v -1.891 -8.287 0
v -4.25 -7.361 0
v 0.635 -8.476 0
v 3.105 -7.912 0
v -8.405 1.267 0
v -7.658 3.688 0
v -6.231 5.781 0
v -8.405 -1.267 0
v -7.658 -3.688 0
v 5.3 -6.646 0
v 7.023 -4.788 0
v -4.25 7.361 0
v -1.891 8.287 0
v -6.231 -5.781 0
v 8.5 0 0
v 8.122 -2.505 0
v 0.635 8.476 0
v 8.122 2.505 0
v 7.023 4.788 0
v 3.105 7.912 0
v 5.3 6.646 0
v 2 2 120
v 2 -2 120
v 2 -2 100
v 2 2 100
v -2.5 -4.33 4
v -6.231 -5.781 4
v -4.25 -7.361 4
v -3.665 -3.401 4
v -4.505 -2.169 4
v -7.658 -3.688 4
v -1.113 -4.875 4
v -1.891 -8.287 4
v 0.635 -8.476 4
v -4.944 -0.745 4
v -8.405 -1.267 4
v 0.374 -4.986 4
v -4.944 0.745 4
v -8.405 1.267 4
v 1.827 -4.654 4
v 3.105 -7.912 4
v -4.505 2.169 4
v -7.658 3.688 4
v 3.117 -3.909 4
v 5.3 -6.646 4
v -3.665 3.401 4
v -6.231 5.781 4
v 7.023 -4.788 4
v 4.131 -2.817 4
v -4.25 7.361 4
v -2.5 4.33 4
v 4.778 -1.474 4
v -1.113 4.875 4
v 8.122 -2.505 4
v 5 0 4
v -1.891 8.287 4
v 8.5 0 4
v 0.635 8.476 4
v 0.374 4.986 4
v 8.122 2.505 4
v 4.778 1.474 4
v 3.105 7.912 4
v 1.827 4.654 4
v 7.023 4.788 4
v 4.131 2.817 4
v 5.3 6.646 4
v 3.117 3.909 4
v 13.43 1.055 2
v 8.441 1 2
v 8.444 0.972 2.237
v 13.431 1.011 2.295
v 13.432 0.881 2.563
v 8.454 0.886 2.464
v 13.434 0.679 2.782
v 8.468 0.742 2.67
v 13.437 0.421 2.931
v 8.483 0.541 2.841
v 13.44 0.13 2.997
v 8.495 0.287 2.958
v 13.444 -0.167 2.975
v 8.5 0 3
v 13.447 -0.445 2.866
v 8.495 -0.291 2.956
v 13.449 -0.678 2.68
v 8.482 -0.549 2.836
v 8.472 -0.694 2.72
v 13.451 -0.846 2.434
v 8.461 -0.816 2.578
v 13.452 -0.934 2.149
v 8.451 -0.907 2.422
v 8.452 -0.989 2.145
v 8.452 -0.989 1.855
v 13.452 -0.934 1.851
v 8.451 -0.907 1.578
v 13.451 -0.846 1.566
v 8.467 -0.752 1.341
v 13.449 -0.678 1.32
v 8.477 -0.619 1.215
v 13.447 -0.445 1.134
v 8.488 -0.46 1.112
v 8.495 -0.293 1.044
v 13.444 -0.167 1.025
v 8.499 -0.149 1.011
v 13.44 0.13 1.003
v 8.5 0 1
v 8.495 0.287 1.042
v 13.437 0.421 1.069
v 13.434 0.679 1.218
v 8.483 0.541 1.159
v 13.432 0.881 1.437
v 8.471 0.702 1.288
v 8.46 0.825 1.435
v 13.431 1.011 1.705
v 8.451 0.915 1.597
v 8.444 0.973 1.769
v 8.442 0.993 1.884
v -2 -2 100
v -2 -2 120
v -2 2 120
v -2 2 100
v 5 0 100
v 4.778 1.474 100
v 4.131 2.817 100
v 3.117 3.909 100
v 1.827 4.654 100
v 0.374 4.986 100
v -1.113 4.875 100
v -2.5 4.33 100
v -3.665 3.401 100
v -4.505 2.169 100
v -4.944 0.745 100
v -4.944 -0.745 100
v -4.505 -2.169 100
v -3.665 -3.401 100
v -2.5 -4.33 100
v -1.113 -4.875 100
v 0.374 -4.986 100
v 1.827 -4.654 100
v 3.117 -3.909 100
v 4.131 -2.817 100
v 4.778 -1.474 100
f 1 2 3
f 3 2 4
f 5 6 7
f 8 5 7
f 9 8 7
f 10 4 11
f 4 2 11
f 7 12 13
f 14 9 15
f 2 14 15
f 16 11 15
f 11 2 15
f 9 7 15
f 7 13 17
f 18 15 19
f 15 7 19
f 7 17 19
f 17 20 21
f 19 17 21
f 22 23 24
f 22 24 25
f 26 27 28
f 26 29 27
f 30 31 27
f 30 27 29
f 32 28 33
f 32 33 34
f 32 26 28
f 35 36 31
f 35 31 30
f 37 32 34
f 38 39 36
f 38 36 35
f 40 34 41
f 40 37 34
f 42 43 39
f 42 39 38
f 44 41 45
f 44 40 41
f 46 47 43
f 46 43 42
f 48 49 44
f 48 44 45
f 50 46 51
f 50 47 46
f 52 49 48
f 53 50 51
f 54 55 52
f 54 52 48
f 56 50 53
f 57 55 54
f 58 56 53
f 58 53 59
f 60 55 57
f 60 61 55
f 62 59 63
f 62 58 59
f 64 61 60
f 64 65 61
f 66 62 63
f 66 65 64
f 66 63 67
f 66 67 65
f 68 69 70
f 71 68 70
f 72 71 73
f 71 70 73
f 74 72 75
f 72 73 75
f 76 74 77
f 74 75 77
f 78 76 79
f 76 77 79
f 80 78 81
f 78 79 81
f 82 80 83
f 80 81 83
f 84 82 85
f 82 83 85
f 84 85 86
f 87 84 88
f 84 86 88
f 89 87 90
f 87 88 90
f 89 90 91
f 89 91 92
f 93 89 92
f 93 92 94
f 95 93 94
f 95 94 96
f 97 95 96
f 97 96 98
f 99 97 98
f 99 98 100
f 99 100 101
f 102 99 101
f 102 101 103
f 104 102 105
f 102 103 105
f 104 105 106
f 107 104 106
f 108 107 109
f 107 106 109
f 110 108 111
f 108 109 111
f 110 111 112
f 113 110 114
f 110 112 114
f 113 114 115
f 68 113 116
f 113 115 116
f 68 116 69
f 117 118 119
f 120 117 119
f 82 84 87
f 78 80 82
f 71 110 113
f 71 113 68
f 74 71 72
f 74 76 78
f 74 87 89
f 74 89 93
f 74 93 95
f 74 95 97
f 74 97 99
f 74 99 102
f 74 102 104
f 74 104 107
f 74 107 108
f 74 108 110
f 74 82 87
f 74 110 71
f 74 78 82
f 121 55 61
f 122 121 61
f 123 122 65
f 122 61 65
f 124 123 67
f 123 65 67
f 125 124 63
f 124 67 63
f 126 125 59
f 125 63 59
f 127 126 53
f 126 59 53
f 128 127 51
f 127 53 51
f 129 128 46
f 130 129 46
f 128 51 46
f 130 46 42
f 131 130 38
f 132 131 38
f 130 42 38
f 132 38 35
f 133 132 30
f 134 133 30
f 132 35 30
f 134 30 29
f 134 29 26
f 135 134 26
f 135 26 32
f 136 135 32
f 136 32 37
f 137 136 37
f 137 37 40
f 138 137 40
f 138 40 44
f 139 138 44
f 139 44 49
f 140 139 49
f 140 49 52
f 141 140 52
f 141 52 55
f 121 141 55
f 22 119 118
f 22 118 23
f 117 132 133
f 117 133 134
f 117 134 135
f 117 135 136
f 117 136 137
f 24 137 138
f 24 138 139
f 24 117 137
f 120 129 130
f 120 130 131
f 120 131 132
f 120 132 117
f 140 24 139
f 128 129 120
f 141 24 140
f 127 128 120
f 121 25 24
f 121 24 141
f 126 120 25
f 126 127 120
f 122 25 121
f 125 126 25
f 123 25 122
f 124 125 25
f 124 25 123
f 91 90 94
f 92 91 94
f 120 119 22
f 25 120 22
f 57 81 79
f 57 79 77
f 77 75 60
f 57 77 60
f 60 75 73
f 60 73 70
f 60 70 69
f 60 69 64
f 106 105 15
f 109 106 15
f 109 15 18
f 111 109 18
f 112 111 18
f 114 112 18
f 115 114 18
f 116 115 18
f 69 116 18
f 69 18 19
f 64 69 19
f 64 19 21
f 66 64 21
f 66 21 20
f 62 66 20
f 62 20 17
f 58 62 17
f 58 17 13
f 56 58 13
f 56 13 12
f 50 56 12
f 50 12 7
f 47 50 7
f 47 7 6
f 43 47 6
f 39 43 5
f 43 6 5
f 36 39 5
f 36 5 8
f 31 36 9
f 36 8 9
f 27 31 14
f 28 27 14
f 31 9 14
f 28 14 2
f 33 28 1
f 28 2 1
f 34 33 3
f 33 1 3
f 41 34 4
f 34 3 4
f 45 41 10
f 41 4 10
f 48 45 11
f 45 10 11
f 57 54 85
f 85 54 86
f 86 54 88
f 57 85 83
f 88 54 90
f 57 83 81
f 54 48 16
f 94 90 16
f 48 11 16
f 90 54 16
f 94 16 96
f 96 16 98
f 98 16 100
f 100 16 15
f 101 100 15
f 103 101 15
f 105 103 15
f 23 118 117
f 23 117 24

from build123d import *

# Parameters (mm, degrees)
F0_R     = 8.5
F1_DEPTH = 4
F2_R     = 5
F3_DEPTH = 100
F4_W     = 4
F4_H     = 4
F5_DEPTH = 20
F8_R     = 1
F9_DEPTH = 5


with BuildPart() as f1:
    # F0 (on Top) → F1 (new body)
    with BuildSketch(Plane.XY):
        Circle(F0_R)
    extrude(amount=F1_DEPTH)

    # F2 (on Top) → F3 (join)
    with BuildSketch(Plane.XY):
        Circle(F2_R)
    extrude(amount=F3_DEPTH)

    # F4 (on face) → F5 (join)
    with BuildSketch(Plane.XY.offset(100)):
        Rectangle(F4_W, F4_H)
    extrude(amount=F5_DEPTH)

    # F8 (on face) → F9 (join)
    with BuildSketch(Plane(origin=(8.440457, 0.093202, 0), x_dir=(-0.011042, 0.999939, 0), z_dir=(0.999939, 0.011042, 0))):
        with Locations((-0.093208, 2)):
            Circle(F8_R)
    extrude(amount=F9_DEPTH)


solid = f1.part
